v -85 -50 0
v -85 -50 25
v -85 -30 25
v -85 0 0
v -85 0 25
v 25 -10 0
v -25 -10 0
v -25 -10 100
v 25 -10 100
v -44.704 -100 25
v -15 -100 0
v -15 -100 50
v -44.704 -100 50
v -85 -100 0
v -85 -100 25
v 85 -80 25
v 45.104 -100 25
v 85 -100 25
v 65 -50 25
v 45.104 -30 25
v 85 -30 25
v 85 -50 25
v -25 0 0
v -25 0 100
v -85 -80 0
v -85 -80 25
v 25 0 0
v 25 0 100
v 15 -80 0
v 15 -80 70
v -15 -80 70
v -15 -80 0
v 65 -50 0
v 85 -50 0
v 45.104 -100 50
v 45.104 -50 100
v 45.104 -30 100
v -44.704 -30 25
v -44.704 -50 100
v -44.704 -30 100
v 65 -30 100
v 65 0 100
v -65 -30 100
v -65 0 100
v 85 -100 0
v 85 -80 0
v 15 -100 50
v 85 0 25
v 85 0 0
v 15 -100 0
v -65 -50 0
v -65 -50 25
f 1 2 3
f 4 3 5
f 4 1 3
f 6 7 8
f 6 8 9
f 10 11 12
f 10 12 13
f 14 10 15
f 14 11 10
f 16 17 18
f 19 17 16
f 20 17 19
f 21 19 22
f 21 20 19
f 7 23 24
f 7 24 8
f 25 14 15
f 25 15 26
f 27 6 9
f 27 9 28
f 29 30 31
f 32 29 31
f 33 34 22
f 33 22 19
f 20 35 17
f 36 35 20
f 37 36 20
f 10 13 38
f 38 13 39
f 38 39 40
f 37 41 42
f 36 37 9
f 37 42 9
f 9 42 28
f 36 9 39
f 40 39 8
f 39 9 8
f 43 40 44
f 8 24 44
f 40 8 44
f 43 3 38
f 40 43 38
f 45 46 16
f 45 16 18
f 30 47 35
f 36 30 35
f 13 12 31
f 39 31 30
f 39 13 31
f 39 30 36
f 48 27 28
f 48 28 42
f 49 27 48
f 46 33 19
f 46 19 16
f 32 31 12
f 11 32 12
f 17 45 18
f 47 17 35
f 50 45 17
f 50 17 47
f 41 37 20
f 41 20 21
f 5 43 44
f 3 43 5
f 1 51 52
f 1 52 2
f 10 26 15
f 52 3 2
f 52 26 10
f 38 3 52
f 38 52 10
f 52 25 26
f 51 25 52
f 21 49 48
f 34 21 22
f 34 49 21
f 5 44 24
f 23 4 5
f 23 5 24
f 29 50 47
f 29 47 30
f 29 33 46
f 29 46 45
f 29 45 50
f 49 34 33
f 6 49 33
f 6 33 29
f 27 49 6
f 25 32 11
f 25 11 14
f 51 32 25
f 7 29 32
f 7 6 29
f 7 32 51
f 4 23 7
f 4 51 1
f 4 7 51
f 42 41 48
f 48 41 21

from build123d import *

# Parameters (mm, degrees)
PAD_DEPTH       = 100
SKETCH002_W     = 61.512183
SKETCH002_H     = 94.726295
SKETCH002_W_2   = 51.517512
SKETCH002_H_2   = 91.373596
POCKET_DEPTH    = 75
POCKET001_DEPTH = 129.705213
POCKET002_DEPTH = 30.001


with BuildPart() as part:
    # Sketch → Pad (new body)
    with BuildSketch(Plane.XY):
        Polygon((-85, 0), (-25, 0), (-25, -10), (25, -10), (25, 0), (85, 0), (85, -50), (65, -50), (85, -80), (85, -100), (15, -100), (15, -80), (-15, -80), (-15, -100), (-85, -100), (-85, -80), (-65, -50), (-85, -50), align=None)
    extrude(amount=PAD_DEPTH)

    # Sketch002 → Pocket (cut)
    with BuildSketch(Plane.XY.offset(100)):
        with Locations((75.860517, -77.363147)):
            Rectangle(SKETCH002_W, SKETCH002_H)
        with Locations((-70.462969, -75.686798)):
            Rectangle(SKETCH002_W_2, SKETCH002_H_2)
    extrude(amount=-POCKET_DEPTH, mode=Mode.SUBTRACT)

    # Sketch003 → Pocket001 (cut, through all)
    with BuildSketch(Plane(origin=(-44.704213, 0, 0), x_dir=(0, -1, 0), z_dir=(-1, 0, 0))):
        Polygon((100, 100), (100, 50), (50, 100), align=None)
    extrude(amount=-POCKET001_DEPTH, mode=Mode.SUBTRACT)

    # Sketch004 → Pocket002 (cut, through all)
    with BuildSketch(Plane.XZ.offset(30)):
        Polygon((-85, 100), (-65, 100), (-85, 25), align=None)
        Polygon((85, 100), (65, 100), (85, 25), align=None)
    extrude(amount=-POCKET002_DEPTH, mode=Mode.SUBTRACT)


solid = part.part
